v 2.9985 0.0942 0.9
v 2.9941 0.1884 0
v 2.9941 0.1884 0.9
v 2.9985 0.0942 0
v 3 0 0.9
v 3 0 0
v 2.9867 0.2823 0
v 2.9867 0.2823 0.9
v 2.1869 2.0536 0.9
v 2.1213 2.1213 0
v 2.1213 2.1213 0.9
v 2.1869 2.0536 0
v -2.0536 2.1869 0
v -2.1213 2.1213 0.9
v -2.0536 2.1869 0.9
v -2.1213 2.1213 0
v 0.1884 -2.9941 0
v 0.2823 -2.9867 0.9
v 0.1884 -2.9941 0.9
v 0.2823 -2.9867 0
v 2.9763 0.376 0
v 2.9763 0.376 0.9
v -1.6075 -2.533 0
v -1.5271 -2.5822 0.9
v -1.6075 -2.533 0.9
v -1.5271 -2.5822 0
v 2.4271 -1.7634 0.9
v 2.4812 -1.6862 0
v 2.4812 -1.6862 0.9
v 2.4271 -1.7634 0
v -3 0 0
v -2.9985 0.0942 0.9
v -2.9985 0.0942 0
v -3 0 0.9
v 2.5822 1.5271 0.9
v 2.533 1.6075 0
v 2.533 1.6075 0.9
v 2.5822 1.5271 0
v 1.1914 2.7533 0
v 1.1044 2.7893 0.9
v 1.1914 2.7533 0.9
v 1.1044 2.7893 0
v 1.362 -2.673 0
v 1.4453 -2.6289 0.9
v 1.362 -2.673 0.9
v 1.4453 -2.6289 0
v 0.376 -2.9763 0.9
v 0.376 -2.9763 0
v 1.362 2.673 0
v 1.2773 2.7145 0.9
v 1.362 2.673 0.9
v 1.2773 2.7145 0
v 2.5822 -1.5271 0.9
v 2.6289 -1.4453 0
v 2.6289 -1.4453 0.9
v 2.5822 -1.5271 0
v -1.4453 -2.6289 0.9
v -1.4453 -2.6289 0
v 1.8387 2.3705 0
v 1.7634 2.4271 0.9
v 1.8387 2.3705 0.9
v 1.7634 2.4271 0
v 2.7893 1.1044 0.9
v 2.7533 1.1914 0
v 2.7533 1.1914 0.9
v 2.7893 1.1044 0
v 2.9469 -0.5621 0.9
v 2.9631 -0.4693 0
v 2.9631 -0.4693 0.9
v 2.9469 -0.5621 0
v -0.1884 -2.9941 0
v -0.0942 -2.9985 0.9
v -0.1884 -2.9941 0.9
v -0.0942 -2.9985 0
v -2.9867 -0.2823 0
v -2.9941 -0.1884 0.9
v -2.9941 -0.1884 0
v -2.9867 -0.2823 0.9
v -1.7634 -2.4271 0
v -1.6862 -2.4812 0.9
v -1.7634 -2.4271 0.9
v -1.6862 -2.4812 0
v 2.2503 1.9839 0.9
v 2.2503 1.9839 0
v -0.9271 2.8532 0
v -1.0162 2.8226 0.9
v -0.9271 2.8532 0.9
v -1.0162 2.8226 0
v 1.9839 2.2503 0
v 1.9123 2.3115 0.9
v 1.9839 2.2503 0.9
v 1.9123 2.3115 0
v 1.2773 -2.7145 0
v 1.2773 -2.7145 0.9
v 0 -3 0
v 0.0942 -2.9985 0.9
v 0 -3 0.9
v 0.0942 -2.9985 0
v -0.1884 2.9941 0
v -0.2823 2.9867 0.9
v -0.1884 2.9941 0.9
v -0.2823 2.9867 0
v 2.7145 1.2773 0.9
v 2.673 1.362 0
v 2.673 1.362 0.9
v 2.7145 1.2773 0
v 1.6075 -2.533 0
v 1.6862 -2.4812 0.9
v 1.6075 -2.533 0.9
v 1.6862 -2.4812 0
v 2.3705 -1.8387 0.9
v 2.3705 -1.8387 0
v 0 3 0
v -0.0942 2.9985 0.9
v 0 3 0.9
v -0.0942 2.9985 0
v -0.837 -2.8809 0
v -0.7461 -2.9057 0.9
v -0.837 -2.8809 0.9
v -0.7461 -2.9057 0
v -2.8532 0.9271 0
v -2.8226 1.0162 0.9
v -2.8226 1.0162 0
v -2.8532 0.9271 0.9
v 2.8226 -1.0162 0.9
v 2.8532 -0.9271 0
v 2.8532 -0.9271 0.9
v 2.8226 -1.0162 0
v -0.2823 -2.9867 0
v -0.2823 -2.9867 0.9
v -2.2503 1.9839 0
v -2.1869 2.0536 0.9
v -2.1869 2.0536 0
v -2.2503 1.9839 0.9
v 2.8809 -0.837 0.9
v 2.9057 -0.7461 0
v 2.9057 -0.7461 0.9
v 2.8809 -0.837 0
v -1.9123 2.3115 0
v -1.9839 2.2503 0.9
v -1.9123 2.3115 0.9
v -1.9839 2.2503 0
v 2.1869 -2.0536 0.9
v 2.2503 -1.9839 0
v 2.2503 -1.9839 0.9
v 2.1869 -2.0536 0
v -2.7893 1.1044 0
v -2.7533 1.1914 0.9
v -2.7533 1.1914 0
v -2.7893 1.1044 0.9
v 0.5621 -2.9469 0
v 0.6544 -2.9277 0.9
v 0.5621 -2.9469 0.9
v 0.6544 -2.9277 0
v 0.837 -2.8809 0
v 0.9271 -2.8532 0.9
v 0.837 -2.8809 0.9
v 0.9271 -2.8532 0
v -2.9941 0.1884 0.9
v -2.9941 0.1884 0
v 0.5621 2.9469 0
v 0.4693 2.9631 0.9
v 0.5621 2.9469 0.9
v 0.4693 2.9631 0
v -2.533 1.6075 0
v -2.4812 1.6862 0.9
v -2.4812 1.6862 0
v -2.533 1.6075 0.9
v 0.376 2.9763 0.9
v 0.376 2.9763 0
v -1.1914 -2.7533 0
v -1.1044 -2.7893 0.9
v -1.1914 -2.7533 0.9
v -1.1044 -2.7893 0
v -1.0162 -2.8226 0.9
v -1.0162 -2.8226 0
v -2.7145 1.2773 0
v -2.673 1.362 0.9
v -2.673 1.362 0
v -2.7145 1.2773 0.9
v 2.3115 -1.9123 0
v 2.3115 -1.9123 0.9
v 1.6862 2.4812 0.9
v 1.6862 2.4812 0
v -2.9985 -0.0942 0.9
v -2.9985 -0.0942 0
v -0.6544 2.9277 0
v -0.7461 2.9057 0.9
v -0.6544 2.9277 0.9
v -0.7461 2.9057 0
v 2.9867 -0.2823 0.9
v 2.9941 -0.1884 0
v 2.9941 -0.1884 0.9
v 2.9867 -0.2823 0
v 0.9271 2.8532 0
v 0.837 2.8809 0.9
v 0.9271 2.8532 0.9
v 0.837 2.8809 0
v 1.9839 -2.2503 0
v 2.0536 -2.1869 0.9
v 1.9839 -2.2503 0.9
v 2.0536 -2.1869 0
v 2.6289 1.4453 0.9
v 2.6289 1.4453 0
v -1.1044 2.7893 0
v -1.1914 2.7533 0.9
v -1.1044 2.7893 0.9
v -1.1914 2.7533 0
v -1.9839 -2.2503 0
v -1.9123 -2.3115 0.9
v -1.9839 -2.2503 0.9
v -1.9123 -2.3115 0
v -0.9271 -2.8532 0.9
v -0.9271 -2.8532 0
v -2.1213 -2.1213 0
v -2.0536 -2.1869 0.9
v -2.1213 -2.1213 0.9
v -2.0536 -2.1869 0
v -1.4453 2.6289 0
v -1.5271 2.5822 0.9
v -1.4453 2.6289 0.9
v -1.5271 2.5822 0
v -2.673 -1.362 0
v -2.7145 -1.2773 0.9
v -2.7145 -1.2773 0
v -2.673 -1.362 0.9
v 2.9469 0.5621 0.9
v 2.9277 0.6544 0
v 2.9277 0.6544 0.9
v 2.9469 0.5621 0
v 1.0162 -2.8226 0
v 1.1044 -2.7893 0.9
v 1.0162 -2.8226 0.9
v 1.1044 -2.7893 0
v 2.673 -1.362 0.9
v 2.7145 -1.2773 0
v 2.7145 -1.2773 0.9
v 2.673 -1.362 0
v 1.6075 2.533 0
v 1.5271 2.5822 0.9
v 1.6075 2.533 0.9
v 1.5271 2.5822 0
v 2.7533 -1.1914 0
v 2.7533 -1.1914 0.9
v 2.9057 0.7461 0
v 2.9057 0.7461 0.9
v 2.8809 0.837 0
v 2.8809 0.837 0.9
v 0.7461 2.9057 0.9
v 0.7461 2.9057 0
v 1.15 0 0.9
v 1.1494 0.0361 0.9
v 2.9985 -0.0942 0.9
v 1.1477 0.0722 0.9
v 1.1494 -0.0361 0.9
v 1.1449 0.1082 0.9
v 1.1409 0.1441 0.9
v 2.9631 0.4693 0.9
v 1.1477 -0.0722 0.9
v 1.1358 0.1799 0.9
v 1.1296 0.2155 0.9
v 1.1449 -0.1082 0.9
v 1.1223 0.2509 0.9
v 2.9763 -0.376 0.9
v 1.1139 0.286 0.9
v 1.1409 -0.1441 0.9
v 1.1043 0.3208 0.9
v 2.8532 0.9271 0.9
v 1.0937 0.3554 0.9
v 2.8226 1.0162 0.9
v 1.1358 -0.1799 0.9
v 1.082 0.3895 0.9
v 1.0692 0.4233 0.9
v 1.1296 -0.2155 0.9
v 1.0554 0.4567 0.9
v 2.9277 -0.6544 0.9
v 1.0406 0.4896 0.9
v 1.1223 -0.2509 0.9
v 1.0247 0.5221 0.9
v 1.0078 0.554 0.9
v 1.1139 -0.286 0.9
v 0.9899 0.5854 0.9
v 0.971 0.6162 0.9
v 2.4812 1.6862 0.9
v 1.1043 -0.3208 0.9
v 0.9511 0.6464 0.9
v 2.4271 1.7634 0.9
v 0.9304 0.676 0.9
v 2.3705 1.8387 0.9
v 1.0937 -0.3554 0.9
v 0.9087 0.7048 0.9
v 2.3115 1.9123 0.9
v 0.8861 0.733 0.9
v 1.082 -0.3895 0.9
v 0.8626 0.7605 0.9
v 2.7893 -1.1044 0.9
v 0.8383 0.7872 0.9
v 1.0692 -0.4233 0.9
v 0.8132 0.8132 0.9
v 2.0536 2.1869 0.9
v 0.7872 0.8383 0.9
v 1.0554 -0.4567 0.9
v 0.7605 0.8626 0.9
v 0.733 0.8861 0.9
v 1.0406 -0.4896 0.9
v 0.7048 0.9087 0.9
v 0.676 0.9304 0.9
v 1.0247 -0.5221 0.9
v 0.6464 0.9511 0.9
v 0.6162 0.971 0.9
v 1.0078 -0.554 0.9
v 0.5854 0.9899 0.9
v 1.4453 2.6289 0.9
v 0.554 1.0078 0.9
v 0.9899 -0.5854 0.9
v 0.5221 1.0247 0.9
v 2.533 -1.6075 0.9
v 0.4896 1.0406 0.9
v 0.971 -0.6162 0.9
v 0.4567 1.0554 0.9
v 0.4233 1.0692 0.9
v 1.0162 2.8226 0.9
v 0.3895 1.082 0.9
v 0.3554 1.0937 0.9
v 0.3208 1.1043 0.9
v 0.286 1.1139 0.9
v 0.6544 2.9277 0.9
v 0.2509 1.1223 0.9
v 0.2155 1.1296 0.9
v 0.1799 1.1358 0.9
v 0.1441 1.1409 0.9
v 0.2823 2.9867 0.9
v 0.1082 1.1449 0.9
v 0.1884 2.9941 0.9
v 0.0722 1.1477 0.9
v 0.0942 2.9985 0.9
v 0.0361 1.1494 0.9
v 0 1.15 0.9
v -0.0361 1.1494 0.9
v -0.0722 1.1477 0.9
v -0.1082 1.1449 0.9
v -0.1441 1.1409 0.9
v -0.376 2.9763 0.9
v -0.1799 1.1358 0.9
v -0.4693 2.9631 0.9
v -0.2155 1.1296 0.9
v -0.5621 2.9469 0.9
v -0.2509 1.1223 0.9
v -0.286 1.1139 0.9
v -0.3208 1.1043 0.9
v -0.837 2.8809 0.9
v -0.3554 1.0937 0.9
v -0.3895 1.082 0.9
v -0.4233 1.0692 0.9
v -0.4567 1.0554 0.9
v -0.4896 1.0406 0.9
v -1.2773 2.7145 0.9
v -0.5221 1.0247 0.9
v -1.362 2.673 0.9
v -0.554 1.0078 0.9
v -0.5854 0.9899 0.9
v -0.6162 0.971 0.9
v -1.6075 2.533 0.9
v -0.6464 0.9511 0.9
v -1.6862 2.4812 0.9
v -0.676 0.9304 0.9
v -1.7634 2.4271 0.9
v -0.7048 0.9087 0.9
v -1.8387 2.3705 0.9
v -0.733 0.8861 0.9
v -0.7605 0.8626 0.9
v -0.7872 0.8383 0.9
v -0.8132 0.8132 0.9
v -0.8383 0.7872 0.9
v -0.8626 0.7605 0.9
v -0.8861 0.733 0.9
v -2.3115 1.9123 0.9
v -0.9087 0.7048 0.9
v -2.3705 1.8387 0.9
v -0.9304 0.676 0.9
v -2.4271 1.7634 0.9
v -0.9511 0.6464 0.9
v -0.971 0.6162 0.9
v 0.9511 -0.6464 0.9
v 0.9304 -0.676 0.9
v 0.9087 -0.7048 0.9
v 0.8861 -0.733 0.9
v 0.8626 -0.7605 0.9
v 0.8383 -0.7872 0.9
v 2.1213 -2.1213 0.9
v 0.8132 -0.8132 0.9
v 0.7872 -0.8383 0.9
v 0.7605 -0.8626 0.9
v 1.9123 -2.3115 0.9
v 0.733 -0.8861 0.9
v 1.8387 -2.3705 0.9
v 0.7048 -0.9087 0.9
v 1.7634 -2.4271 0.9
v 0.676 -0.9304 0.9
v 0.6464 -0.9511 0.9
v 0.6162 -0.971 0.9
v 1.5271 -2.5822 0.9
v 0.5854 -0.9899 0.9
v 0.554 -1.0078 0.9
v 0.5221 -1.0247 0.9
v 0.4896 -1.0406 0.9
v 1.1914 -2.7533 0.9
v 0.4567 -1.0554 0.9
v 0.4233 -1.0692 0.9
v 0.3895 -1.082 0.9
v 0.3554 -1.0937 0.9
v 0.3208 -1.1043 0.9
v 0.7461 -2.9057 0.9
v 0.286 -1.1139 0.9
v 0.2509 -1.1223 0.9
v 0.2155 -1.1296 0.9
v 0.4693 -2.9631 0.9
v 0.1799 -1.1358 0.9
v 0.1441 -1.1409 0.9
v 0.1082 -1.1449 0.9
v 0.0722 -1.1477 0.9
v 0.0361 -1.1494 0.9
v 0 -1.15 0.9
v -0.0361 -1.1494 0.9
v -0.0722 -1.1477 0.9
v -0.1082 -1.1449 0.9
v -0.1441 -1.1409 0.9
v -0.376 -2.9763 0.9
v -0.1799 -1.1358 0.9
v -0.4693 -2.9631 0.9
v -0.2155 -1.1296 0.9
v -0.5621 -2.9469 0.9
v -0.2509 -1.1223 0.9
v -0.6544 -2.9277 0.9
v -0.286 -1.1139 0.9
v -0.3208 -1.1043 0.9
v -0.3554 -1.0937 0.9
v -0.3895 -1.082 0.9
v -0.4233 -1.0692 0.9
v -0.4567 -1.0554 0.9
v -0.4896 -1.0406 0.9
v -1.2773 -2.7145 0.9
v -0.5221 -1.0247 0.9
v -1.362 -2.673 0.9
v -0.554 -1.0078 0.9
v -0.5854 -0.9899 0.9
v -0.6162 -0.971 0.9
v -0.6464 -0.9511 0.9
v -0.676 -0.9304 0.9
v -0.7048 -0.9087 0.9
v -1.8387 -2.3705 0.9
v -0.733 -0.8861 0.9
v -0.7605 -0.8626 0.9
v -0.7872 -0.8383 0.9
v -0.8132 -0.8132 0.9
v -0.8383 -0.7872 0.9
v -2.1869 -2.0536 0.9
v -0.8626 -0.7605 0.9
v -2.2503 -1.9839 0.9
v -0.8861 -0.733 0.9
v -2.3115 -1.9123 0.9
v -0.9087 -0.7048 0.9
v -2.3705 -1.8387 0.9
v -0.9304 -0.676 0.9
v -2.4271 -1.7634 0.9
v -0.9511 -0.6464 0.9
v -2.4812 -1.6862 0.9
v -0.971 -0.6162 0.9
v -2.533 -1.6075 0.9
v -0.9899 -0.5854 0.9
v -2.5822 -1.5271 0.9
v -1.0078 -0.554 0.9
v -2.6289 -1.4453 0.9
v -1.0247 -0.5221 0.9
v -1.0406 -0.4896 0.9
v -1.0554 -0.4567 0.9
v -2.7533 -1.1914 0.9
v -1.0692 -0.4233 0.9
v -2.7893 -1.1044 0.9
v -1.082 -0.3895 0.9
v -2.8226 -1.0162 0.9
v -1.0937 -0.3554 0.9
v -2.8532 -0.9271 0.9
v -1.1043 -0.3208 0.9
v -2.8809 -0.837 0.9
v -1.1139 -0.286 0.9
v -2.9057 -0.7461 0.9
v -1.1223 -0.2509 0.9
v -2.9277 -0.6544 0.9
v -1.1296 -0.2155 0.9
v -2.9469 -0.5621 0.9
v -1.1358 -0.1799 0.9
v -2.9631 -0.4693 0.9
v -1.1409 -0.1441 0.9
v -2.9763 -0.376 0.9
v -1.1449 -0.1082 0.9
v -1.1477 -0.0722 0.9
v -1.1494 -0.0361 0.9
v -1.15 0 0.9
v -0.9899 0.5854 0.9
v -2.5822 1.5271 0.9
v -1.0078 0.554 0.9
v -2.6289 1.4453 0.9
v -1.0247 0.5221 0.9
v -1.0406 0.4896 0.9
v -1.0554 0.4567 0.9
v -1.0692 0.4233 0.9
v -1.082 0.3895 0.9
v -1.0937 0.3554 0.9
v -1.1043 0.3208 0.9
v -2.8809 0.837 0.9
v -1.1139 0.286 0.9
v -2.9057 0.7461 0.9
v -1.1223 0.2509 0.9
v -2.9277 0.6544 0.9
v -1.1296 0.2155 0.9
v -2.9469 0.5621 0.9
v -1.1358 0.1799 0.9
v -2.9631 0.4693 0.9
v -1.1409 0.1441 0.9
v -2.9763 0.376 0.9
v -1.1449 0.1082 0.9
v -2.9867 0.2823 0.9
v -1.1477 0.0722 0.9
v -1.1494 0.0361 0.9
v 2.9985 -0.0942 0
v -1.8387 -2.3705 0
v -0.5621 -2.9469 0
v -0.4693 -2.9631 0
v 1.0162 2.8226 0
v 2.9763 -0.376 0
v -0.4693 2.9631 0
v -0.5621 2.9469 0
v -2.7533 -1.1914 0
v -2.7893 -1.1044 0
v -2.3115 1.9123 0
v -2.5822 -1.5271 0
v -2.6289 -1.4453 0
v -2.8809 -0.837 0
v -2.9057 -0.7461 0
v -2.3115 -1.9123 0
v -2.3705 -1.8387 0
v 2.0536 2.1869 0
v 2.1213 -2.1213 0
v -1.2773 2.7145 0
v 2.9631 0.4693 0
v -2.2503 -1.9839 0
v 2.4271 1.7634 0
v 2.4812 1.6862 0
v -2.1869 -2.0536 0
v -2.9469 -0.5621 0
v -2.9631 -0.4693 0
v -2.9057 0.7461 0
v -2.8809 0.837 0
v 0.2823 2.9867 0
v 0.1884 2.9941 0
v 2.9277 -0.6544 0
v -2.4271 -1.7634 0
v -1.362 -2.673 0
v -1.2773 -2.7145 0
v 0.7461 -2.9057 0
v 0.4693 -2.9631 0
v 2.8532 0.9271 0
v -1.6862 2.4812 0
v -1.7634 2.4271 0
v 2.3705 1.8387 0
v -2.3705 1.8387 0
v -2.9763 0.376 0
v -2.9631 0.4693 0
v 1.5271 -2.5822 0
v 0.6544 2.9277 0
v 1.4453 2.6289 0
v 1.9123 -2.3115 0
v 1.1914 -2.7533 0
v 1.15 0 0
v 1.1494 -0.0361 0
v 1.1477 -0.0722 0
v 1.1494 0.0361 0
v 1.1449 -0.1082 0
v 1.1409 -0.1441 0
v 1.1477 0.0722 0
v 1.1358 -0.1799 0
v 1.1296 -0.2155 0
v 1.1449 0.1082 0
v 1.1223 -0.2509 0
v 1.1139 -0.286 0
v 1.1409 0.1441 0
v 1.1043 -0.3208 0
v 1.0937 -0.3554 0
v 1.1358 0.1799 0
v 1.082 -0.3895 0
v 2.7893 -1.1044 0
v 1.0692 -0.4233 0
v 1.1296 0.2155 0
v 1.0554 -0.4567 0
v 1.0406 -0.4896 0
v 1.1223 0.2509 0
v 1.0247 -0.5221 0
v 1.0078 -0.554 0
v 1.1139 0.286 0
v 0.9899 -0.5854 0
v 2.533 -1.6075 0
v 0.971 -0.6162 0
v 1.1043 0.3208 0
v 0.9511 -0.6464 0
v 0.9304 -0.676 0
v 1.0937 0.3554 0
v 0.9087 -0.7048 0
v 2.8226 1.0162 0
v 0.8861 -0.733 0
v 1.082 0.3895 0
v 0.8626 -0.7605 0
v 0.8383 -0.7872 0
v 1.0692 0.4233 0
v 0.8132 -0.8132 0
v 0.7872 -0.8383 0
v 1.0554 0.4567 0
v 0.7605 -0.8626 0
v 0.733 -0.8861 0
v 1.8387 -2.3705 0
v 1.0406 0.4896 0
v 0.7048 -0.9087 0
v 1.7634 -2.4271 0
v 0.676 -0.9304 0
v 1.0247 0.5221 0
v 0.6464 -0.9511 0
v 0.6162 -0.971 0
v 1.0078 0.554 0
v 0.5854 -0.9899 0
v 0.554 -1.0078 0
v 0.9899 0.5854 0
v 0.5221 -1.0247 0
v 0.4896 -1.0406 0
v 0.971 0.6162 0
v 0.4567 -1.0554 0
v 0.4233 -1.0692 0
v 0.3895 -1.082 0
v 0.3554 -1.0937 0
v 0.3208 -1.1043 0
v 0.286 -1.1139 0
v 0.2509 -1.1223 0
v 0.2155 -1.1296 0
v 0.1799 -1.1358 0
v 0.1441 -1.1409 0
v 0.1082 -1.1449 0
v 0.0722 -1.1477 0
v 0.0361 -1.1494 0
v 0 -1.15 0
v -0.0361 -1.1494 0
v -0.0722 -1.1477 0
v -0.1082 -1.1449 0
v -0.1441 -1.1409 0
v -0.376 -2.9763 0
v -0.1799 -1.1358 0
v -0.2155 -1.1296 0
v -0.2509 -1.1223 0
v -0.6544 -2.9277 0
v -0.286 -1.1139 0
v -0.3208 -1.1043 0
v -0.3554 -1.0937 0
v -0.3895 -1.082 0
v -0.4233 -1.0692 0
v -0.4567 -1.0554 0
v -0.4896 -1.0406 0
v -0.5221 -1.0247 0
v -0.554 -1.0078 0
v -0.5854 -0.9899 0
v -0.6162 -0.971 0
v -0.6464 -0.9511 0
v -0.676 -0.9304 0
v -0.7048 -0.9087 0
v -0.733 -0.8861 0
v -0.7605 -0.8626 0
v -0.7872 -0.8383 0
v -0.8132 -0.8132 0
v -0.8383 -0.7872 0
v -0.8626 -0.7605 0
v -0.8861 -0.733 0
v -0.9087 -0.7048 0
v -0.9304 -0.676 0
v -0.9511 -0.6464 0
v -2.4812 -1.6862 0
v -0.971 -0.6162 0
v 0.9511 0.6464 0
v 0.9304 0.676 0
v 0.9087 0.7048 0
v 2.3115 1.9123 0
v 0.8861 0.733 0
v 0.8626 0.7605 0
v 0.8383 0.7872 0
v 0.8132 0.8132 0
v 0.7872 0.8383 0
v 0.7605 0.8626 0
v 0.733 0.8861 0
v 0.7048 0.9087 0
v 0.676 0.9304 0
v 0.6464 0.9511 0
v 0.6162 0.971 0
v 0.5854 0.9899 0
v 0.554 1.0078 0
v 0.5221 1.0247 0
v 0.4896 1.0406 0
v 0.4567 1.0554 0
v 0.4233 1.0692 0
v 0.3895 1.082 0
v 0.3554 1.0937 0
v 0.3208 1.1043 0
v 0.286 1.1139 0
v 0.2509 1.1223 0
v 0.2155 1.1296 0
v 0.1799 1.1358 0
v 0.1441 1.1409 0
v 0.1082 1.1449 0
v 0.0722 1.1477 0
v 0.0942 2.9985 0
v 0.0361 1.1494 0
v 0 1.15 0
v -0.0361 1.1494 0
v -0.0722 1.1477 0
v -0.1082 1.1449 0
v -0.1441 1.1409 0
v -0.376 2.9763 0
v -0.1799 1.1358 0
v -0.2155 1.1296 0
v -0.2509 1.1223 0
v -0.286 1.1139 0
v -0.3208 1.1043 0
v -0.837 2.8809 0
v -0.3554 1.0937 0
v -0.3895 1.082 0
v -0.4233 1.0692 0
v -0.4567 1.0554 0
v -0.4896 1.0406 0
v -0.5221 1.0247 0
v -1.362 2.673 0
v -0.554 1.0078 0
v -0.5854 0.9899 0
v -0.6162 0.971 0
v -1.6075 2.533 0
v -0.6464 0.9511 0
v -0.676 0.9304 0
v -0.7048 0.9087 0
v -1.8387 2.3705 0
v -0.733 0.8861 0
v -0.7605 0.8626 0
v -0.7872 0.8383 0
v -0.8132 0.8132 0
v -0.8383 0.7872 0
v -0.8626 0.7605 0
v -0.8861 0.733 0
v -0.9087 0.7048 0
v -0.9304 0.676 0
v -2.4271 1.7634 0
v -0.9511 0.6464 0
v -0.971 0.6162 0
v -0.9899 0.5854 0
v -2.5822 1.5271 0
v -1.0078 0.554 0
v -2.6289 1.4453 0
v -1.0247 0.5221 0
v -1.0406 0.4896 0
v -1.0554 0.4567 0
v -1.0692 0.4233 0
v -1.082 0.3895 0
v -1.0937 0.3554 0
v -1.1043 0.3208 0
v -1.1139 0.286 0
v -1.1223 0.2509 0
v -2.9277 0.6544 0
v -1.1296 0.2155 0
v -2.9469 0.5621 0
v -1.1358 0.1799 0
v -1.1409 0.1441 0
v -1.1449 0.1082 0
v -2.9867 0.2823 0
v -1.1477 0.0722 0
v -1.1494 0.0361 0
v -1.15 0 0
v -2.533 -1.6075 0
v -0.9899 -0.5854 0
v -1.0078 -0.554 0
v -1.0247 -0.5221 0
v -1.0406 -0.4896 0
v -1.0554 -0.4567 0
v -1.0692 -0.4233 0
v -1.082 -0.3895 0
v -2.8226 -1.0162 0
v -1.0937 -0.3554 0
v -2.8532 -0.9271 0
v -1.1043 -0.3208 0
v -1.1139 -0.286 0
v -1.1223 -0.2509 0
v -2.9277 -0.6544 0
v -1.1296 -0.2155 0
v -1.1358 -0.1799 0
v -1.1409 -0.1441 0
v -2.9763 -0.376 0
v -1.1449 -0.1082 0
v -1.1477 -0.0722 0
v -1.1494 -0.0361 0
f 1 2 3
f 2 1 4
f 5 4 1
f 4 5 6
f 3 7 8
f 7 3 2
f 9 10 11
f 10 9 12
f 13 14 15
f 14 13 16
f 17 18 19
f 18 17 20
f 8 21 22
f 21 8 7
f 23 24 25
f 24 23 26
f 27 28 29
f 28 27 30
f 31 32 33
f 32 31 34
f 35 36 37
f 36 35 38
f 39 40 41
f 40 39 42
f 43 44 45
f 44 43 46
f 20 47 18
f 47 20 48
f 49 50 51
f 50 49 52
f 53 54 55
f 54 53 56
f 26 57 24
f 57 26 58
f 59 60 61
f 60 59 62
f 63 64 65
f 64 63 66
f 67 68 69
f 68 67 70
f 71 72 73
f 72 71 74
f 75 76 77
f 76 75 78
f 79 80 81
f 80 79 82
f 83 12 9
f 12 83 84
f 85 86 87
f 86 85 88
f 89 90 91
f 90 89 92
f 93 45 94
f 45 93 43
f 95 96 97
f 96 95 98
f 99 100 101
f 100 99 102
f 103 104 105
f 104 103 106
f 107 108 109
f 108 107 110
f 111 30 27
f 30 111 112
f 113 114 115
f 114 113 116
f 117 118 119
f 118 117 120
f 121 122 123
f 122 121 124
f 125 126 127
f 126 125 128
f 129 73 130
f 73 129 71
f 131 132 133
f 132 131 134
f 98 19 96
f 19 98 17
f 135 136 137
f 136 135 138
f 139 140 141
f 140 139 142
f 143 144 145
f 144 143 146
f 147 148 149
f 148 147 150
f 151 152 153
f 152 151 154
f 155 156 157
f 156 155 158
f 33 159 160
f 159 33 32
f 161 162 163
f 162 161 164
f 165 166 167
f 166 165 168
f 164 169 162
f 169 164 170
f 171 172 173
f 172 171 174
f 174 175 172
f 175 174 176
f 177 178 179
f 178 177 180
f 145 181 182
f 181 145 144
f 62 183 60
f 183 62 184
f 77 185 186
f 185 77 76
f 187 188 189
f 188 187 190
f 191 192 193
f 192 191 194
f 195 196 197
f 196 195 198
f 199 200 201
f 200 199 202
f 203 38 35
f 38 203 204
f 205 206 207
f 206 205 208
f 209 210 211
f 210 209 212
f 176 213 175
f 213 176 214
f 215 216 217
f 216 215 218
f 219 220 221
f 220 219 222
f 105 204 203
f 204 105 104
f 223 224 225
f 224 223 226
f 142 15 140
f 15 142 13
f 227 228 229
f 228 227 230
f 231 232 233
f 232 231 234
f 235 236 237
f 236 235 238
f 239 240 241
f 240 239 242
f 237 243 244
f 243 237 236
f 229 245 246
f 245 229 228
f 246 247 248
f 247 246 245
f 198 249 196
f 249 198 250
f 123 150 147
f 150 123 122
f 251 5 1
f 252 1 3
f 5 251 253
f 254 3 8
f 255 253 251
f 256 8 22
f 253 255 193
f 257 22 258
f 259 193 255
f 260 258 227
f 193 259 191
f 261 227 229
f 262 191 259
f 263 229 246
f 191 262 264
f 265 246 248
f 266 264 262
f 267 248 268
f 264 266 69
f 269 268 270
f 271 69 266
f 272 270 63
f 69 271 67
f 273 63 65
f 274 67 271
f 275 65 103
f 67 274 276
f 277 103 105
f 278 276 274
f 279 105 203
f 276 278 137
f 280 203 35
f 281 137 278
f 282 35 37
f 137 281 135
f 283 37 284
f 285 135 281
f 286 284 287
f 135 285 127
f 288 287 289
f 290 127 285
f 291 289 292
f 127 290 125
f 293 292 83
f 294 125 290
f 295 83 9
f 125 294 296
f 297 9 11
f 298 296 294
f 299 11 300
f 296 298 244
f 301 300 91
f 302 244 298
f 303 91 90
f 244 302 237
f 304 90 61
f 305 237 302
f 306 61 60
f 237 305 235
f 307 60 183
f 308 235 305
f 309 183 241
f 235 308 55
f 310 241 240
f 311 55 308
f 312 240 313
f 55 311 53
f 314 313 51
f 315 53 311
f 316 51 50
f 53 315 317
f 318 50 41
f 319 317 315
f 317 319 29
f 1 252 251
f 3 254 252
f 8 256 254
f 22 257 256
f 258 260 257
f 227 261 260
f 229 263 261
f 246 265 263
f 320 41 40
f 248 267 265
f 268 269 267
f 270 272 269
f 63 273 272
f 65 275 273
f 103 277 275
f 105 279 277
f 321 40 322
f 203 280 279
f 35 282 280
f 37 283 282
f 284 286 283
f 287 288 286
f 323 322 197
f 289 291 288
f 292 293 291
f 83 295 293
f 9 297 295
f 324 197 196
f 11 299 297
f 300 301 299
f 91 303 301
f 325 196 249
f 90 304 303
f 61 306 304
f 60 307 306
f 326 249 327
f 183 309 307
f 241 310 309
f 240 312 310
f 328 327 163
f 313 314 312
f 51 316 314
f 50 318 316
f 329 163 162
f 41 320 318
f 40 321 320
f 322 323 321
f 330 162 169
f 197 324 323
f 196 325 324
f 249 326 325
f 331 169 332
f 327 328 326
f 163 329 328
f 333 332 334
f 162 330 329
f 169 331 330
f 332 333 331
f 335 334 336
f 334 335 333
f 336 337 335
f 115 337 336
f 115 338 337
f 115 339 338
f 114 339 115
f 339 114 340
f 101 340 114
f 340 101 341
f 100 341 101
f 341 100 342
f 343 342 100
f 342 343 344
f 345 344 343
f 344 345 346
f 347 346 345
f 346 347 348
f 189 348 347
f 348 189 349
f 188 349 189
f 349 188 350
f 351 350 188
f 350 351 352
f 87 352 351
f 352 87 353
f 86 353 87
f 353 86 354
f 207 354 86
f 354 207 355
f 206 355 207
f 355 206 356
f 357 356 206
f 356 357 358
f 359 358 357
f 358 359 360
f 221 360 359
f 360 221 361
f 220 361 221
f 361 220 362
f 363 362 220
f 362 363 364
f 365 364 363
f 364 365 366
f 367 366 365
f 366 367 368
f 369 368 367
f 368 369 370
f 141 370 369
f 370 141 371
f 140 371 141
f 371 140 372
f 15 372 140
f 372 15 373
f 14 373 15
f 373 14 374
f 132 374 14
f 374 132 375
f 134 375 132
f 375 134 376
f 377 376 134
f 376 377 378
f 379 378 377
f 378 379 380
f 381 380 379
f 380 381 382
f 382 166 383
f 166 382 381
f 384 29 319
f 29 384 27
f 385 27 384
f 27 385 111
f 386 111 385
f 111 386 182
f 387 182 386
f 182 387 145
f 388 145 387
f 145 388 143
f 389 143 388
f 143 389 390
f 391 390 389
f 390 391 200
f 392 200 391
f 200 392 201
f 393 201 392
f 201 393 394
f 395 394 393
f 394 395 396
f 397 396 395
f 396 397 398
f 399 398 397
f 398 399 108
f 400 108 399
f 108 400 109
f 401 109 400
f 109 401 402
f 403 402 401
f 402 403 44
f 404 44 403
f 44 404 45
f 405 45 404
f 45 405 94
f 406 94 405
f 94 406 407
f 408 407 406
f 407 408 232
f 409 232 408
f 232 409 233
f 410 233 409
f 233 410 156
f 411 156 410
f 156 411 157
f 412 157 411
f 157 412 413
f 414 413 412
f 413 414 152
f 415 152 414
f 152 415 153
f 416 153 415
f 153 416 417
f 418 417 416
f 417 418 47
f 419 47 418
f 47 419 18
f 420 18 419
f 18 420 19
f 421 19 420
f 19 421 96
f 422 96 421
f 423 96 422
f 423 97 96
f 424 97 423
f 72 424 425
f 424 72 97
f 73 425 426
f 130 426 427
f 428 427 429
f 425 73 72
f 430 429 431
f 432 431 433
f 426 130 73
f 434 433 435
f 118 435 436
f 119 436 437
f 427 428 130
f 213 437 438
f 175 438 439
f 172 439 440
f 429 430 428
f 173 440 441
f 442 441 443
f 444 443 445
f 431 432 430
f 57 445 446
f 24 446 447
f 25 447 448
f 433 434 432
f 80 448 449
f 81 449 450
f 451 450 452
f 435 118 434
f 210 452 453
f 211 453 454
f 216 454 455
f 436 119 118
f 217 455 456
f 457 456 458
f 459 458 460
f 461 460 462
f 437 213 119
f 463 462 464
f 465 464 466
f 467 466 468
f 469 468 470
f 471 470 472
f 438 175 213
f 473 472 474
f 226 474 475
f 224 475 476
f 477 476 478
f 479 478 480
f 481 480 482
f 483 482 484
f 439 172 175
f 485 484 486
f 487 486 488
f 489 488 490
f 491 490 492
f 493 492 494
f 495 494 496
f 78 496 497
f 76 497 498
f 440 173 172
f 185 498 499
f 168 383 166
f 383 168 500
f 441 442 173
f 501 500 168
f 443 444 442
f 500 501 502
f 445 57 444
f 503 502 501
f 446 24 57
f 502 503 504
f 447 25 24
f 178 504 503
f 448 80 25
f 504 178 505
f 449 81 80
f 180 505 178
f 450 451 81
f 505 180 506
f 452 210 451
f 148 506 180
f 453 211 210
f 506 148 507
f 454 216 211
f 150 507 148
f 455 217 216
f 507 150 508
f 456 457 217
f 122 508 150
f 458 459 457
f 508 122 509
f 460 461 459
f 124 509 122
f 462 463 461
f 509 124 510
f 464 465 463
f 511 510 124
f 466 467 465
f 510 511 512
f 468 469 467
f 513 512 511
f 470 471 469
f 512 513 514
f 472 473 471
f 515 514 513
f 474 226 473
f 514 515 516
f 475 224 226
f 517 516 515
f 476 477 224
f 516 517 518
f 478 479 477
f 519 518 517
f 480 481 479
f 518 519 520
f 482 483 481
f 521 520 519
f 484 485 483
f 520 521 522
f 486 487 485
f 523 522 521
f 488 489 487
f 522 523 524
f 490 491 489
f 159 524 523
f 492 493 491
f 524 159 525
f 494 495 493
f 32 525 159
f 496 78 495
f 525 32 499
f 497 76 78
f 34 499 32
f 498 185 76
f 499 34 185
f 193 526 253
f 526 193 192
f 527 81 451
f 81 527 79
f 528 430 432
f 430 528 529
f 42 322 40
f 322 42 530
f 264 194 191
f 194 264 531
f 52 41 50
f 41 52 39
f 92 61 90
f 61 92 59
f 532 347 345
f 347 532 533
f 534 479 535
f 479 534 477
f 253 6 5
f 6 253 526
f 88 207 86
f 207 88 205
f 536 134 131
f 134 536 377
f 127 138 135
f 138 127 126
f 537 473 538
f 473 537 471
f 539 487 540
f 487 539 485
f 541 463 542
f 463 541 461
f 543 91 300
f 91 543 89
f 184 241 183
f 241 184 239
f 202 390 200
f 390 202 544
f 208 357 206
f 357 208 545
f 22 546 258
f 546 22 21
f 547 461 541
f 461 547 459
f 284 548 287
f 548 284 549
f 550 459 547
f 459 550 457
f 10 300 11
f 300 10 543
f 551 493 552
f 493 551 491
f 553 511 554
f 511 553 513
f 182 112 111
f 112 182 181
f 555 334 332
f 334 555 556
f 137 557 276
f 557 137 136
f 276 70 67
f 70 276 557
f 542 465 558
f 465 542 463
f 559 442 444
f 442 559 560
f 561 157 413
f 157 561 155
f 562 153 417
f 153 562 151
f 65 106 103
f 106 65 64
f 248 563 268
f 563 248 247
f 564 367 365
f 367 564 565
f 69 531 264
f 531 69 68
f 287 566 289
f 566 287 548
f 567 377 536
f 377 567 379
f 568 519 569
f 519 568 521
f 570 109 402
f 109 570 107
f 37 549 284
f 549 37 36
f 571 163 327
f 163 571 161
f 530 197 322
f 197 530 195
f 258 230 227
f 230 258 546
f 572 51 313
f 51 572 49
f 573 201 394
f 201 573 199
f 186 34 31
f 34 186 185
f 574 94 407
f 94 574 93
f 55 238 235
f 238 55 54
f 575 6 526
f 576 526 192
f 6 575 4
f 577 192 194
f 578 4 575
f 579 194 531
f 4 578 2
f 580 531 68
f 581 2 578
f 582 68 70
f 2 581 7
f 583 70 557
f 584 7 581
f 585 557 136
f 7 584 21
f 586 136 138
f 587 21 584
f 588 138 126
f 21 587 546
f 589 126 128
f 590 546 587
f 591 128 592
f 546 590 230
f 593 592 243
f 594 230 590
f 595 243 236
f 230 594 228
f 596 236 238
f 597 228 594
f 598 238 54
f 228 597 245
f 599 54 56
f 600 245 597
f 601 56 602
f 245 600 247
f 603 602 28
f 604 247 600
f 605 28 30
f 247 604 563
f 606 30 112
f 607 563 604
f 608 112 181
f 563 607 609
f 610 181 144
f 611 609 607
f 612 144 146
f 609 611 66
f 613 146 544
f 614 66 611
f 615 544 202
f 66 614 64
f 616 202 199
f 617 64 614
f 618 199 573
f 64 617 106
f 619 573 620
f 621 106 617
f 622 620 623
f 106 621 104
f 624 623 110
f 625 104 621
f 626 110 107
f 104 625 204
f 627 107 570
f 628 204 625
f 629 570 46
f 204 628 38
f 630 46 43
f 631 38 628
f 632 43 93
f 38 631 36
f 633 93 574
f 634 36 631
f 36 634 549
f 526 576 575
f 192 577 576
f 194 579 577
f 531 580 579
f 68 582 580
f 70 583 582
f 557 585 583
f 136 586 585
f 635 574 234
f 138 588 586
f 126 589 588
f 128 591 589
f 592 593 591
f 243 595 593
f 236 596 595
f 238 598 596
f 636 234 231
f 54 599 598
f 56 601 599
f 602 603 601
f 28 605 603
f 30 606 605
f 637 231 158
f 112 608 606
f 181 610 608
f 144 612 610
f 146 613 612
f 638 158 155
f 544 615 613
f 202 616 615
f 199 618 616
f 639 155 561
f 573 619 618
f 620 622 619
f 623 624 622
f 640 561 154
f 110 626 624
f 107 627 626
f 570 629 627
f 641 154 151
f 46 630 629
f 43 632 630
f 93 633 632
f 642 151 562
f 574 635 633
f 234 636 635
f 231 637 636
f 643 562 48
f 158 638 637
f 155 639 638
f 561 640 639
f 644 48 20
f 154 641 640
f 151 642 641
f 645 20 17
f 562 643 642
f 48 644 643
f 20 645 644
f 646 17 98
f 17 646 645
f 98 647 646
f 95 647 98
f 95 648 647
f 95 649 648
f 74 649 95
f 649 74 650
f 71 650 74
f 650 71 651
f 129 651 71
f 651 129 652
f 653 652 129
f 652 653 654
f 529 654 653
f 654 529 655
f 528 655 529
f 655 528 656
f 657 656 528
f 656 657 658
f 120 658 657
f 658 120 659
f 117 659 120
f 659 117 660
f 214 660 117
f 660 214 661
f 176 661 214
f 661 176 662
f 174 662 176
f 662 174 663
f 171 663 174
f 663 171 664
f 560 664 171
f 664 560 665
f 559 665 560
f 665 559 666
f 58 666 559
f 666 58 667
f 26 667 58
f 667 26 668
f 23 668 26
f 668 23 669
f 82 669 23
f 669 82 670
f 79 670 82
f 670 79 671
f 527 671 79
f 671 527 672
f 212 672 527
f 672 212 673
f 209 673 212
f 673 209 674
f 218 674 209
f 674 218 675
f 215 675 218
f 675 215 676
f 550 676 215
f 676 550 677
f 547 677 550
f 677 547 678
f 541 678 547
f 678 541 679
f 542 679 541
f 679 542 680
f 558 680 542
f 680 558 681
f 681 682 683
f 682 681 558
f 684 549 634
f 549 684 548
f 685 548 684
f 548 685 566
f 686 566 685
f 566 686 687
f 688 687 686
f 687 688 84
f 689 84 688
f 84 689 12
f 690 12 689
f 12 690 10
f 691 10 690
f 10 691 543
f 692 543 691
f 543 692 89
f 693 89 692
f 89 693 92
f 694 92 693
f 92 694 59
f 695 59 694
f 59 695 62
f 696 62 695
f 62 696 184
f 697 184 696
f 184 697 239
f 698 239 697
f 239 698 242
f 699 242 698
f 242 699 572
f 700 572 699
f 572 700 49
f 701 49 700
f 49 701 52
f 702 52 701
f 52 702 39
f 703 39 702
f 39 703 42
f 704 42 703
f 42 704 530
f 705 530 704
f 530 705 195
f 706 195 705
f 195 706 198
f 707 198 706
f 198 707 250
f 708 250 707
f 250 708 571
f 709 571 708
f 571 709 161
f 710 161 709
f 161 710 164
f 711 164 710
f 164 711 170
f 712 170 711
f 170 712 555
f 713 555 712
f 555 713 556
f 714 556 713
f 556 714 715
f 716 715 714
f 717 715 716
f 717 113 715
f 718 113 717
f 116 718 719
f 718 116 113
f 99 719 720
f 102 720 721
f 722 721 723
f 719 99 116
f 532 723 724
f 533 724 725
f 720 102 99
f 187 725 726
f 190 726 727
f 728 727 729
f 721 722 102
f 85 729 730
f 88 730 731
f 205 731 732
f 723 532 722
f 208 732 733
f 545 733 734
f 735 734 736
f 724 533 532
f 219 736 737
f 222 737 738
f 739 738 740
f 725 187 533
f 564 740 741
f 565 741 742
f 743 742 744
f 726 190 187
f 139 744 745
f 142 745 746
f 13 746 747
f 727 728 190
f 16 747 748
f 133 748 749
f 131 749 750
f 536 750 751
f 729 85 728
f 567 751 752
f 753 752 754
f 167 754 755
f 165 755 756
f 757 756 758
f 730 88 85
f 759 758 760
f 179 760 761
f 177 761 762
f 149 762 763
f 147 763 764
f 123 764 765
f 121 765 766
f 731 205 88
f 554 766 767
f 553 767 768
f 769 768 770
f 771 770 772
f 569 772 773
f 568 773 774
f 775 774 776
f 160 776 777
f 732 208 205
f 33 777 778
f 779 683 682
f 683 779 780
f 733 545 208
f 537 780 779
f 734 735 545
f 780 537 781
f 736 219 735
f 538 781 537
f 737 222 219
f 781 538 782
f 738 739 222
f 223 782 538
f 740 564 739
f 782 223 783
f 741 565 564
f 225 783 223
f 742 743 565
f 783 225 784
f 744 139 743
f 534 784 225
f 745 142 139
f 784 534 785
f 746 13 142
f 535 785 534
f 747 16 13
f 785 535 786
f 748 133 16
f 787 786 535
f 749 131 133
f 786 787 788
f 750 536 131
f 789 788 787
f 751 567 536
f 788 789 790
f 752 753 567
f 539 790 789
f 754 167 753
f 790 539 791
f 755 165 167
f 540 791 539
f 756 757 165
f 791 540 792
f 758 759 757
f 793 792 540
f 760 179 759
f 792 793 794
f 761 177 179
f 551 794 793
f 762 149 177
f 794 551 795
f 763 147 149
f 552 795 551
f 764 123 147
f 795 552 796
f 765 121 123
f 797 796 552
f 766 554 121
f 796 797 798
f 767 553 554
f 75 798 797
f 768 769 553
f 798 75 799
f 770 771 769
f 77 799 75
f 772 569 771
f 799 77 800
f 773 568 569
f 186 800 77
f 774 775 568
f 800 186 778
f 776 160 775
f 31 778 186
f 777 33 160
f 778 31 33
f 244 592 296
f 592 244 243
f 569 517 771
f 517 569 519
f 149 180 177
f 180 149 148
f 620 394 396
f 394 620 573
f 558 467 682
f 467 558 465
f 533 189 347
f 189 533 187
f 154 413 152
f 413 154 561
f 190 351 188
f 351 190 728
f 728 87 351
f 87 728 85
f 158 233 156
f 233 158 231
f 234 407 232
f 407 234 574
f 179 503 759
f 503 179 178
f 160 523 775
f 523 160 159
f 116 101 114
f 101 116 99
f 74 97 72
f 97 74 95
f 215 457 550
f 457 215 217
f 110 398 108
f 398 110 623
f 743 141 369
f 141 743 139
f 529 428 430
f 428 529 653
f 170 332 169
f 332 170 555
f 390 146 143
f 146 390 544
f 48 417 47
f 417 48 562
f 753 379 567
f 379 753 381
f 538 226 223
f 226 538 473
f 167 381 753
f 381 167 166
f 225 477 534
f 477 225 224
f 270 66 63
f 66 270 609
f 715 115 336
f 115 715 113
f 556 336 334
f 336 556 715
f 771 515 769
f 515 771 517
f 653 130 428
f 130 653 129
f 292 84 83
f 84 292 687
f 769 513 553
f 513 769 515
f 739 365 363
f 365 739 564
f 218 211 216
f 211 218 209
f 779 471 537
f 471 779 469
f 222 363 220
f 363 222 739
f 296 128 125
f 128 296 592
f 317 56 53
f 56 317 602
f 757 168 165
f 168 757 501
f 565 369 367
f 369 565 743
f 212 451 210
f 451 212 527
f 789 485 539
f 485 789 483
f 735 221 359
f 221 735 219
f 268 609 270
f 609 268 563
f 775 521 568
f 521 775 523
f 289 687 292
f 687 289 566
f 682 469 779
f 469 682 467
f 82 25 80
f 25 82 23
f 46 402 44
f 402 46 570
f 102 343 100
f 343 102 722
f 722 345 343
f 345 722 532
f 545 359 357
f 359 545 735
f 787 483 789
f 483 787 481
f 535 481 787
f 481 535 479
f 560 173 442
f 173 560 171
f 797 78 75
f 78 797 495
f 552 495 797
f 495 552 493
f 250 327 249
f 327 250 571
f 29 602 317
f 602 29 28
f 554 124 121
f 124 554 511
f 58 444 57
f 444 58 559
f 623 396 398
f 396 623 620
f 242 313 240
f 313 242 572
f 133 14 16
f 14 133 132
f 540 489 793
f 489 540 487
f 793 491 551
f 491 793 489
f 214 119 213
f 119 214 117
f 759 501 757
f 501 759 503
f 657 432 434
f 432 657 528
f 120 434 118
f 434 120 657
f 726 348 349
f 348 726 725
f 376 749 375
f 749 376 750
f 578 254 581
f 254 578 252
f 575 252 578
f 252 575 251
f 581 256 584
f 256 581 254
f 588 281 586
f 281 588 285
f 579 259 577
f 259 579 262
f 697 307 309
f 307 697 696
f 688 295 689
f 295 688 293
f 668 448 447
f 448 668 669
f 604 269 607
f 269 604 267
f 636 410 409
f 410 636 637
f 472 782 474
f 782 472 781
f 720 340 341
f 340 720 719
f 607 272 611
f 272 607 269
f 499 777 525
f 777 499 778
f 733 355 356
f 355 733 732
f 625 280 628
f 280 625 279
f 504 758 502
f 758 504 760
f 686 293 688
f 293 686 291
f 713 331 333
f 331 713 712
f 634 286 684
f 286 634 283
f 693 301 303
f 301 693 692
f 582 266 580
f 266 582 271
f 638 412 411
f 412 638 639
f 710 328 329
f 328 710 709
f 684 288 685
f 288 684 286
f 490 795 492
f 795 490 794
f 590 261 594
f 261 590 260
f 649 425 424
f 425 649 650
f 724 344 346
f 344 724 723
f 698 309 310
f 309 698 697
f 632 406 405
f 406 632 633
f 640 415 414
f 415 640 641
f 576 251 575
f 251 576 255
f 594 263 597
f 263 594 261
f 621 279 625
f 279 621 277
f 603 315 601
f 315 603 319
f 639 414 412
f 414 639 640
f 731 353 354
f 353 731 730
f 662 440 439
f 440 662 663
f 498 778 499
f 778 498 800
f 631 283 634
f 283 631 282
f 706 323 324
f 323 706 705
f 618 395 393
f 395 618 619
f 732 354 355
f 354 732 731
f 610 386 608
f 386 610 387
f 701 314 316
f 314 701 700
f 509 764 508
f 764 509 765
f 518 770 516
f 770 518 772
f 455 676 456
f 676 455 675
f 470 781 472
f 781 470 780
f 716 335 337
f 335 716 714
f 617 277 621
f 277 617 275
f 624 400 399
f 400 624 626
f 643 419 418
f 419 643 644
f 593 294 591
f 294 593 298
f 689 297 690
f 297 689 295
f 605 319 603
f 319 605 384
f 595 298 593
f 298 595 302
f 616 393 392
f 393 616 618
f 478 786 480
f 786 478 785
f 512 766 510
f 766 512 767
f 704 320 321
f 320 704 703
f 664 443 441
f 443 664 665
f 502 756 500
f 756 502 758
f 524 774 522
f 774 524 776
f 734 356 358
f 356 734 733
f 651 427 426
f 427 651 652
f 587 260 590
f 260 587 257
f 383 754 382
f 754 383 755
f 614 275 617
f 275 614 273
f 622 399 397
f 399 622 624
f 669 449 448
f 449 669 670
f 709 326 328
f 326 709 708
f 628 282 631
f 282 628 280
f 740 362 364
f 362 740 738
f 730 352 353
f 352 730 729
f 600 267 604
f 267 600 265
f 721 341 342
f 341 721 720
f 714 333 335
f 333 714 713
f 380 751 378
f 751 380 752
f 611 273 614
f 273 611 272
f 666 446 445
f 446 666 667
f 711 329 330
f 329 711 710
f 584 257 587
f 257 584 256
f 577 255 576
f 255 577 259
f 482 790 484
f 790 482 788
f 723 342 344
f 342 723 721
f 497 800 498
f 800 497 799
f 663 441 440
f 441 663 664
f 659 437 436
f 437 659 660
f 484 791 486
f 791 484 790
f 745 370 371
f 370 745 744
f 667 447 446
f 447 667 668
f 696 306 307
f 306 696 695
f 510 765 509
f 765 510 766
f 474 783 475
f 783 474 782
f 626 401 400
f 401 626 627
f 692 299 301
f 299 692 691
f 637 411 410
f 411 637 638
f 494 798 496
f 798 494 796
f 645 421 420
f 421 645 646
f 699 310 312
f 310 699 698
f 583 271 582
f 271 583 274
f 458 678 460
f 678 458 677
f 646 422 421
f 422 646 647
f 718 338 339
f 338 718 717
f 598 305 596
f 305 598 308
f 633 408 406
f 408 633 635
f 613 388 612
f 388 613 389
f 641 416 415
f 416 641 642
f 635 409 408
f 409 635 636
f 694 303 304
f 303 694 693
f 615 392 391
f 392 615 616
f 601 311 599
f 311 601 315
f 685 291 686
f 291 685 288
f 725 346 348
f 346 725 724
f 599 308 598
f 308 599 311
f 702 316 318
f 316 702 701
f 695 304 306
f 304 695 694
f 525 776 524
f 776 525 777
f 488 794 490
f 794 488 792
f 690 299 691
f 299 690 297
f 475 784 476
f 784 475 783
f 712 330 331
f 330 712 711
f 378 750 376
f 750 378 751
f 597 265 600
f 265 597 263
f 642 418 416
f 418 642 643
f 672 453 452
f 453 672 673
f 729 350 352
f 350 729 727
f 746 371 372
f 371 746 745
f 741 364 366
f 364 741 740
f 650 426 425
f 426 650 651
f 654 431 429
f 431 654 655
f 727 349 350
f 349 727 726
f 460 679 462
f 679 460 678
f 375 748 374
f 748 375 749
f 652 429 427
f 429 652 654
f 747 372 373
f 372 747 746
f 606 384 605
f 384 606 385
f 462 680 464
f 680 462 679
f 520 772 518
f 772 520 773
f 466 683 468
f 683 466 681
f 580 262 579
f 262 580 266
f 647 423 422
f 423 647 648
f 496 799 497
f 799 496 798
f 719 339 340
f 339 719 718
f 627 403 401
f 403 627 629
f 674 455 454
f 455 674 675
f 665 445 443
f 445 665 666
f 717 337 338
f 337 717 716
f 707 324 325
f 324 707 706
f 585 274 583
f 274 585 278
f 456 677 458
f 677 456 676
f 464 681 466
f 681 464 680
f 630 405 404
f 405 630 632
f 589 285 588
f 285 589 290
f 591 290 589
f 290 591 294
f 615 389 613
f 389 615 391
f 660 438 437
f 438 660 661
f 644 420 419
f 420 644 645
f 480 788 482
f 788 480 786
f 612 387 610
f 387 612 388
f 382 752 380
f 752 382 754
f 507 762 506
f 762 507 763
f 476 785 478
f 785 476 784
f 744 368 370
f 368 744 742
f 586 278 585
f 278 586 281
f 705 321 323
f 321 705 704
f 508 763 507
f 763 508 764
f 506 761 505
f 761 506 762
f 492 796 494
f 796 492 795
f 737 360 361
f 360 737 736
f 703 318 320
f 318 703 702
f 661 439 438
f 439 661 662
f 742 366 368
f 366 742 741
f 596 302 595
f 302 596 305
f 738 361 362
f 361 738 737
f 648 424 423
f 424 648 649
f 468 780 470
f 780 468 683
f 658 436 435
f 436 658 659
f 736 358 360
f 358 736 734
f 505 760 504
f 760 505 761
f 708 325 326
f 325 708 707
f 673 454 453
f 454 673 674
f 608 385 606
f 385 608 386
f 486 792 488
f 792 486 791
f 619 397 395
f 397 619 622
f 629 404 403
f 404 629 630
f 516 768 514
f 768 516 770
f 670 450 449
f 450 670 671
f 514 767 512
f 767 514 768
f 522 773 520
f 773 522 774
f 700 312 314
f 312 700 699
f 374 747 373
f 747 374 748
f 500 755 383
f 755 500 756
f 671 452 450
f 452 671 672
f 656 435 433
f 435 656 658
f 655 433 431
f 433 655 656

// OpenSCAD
rehaussePMMA();

module rehaussePMMA()
{
anneau(6,2.3,.9);
}

module calePmma()
{
difference()
{

l=40;

anneau(98,96,7);
for(i=[0:1:5])
    rotate([0,0,i*360/6]) translate([96/2-5,-l/2,2]) cube([10,l,7]);
}

}

module anneau(de,di,ep)
{
    difference()
    {
        cylinder(ep,de/2,de/2,$fn=200);
        translate([0,0,-.1]) cylinder(ep+.2,di/2,di/2,$fn=200);
        
    }
}


module calePMMA2()
{
    cylinder(2,1.5,1.5,$fn=20);
    translate([0,0,2]) hull()
    {
        cylinder(1,2,2,$fn=20);
        translate([1,-1,4.9]) cube([1,2,.1]); 
    }

}


module rehausseCarte()
{
    anneau(6,3.2,2);
}
